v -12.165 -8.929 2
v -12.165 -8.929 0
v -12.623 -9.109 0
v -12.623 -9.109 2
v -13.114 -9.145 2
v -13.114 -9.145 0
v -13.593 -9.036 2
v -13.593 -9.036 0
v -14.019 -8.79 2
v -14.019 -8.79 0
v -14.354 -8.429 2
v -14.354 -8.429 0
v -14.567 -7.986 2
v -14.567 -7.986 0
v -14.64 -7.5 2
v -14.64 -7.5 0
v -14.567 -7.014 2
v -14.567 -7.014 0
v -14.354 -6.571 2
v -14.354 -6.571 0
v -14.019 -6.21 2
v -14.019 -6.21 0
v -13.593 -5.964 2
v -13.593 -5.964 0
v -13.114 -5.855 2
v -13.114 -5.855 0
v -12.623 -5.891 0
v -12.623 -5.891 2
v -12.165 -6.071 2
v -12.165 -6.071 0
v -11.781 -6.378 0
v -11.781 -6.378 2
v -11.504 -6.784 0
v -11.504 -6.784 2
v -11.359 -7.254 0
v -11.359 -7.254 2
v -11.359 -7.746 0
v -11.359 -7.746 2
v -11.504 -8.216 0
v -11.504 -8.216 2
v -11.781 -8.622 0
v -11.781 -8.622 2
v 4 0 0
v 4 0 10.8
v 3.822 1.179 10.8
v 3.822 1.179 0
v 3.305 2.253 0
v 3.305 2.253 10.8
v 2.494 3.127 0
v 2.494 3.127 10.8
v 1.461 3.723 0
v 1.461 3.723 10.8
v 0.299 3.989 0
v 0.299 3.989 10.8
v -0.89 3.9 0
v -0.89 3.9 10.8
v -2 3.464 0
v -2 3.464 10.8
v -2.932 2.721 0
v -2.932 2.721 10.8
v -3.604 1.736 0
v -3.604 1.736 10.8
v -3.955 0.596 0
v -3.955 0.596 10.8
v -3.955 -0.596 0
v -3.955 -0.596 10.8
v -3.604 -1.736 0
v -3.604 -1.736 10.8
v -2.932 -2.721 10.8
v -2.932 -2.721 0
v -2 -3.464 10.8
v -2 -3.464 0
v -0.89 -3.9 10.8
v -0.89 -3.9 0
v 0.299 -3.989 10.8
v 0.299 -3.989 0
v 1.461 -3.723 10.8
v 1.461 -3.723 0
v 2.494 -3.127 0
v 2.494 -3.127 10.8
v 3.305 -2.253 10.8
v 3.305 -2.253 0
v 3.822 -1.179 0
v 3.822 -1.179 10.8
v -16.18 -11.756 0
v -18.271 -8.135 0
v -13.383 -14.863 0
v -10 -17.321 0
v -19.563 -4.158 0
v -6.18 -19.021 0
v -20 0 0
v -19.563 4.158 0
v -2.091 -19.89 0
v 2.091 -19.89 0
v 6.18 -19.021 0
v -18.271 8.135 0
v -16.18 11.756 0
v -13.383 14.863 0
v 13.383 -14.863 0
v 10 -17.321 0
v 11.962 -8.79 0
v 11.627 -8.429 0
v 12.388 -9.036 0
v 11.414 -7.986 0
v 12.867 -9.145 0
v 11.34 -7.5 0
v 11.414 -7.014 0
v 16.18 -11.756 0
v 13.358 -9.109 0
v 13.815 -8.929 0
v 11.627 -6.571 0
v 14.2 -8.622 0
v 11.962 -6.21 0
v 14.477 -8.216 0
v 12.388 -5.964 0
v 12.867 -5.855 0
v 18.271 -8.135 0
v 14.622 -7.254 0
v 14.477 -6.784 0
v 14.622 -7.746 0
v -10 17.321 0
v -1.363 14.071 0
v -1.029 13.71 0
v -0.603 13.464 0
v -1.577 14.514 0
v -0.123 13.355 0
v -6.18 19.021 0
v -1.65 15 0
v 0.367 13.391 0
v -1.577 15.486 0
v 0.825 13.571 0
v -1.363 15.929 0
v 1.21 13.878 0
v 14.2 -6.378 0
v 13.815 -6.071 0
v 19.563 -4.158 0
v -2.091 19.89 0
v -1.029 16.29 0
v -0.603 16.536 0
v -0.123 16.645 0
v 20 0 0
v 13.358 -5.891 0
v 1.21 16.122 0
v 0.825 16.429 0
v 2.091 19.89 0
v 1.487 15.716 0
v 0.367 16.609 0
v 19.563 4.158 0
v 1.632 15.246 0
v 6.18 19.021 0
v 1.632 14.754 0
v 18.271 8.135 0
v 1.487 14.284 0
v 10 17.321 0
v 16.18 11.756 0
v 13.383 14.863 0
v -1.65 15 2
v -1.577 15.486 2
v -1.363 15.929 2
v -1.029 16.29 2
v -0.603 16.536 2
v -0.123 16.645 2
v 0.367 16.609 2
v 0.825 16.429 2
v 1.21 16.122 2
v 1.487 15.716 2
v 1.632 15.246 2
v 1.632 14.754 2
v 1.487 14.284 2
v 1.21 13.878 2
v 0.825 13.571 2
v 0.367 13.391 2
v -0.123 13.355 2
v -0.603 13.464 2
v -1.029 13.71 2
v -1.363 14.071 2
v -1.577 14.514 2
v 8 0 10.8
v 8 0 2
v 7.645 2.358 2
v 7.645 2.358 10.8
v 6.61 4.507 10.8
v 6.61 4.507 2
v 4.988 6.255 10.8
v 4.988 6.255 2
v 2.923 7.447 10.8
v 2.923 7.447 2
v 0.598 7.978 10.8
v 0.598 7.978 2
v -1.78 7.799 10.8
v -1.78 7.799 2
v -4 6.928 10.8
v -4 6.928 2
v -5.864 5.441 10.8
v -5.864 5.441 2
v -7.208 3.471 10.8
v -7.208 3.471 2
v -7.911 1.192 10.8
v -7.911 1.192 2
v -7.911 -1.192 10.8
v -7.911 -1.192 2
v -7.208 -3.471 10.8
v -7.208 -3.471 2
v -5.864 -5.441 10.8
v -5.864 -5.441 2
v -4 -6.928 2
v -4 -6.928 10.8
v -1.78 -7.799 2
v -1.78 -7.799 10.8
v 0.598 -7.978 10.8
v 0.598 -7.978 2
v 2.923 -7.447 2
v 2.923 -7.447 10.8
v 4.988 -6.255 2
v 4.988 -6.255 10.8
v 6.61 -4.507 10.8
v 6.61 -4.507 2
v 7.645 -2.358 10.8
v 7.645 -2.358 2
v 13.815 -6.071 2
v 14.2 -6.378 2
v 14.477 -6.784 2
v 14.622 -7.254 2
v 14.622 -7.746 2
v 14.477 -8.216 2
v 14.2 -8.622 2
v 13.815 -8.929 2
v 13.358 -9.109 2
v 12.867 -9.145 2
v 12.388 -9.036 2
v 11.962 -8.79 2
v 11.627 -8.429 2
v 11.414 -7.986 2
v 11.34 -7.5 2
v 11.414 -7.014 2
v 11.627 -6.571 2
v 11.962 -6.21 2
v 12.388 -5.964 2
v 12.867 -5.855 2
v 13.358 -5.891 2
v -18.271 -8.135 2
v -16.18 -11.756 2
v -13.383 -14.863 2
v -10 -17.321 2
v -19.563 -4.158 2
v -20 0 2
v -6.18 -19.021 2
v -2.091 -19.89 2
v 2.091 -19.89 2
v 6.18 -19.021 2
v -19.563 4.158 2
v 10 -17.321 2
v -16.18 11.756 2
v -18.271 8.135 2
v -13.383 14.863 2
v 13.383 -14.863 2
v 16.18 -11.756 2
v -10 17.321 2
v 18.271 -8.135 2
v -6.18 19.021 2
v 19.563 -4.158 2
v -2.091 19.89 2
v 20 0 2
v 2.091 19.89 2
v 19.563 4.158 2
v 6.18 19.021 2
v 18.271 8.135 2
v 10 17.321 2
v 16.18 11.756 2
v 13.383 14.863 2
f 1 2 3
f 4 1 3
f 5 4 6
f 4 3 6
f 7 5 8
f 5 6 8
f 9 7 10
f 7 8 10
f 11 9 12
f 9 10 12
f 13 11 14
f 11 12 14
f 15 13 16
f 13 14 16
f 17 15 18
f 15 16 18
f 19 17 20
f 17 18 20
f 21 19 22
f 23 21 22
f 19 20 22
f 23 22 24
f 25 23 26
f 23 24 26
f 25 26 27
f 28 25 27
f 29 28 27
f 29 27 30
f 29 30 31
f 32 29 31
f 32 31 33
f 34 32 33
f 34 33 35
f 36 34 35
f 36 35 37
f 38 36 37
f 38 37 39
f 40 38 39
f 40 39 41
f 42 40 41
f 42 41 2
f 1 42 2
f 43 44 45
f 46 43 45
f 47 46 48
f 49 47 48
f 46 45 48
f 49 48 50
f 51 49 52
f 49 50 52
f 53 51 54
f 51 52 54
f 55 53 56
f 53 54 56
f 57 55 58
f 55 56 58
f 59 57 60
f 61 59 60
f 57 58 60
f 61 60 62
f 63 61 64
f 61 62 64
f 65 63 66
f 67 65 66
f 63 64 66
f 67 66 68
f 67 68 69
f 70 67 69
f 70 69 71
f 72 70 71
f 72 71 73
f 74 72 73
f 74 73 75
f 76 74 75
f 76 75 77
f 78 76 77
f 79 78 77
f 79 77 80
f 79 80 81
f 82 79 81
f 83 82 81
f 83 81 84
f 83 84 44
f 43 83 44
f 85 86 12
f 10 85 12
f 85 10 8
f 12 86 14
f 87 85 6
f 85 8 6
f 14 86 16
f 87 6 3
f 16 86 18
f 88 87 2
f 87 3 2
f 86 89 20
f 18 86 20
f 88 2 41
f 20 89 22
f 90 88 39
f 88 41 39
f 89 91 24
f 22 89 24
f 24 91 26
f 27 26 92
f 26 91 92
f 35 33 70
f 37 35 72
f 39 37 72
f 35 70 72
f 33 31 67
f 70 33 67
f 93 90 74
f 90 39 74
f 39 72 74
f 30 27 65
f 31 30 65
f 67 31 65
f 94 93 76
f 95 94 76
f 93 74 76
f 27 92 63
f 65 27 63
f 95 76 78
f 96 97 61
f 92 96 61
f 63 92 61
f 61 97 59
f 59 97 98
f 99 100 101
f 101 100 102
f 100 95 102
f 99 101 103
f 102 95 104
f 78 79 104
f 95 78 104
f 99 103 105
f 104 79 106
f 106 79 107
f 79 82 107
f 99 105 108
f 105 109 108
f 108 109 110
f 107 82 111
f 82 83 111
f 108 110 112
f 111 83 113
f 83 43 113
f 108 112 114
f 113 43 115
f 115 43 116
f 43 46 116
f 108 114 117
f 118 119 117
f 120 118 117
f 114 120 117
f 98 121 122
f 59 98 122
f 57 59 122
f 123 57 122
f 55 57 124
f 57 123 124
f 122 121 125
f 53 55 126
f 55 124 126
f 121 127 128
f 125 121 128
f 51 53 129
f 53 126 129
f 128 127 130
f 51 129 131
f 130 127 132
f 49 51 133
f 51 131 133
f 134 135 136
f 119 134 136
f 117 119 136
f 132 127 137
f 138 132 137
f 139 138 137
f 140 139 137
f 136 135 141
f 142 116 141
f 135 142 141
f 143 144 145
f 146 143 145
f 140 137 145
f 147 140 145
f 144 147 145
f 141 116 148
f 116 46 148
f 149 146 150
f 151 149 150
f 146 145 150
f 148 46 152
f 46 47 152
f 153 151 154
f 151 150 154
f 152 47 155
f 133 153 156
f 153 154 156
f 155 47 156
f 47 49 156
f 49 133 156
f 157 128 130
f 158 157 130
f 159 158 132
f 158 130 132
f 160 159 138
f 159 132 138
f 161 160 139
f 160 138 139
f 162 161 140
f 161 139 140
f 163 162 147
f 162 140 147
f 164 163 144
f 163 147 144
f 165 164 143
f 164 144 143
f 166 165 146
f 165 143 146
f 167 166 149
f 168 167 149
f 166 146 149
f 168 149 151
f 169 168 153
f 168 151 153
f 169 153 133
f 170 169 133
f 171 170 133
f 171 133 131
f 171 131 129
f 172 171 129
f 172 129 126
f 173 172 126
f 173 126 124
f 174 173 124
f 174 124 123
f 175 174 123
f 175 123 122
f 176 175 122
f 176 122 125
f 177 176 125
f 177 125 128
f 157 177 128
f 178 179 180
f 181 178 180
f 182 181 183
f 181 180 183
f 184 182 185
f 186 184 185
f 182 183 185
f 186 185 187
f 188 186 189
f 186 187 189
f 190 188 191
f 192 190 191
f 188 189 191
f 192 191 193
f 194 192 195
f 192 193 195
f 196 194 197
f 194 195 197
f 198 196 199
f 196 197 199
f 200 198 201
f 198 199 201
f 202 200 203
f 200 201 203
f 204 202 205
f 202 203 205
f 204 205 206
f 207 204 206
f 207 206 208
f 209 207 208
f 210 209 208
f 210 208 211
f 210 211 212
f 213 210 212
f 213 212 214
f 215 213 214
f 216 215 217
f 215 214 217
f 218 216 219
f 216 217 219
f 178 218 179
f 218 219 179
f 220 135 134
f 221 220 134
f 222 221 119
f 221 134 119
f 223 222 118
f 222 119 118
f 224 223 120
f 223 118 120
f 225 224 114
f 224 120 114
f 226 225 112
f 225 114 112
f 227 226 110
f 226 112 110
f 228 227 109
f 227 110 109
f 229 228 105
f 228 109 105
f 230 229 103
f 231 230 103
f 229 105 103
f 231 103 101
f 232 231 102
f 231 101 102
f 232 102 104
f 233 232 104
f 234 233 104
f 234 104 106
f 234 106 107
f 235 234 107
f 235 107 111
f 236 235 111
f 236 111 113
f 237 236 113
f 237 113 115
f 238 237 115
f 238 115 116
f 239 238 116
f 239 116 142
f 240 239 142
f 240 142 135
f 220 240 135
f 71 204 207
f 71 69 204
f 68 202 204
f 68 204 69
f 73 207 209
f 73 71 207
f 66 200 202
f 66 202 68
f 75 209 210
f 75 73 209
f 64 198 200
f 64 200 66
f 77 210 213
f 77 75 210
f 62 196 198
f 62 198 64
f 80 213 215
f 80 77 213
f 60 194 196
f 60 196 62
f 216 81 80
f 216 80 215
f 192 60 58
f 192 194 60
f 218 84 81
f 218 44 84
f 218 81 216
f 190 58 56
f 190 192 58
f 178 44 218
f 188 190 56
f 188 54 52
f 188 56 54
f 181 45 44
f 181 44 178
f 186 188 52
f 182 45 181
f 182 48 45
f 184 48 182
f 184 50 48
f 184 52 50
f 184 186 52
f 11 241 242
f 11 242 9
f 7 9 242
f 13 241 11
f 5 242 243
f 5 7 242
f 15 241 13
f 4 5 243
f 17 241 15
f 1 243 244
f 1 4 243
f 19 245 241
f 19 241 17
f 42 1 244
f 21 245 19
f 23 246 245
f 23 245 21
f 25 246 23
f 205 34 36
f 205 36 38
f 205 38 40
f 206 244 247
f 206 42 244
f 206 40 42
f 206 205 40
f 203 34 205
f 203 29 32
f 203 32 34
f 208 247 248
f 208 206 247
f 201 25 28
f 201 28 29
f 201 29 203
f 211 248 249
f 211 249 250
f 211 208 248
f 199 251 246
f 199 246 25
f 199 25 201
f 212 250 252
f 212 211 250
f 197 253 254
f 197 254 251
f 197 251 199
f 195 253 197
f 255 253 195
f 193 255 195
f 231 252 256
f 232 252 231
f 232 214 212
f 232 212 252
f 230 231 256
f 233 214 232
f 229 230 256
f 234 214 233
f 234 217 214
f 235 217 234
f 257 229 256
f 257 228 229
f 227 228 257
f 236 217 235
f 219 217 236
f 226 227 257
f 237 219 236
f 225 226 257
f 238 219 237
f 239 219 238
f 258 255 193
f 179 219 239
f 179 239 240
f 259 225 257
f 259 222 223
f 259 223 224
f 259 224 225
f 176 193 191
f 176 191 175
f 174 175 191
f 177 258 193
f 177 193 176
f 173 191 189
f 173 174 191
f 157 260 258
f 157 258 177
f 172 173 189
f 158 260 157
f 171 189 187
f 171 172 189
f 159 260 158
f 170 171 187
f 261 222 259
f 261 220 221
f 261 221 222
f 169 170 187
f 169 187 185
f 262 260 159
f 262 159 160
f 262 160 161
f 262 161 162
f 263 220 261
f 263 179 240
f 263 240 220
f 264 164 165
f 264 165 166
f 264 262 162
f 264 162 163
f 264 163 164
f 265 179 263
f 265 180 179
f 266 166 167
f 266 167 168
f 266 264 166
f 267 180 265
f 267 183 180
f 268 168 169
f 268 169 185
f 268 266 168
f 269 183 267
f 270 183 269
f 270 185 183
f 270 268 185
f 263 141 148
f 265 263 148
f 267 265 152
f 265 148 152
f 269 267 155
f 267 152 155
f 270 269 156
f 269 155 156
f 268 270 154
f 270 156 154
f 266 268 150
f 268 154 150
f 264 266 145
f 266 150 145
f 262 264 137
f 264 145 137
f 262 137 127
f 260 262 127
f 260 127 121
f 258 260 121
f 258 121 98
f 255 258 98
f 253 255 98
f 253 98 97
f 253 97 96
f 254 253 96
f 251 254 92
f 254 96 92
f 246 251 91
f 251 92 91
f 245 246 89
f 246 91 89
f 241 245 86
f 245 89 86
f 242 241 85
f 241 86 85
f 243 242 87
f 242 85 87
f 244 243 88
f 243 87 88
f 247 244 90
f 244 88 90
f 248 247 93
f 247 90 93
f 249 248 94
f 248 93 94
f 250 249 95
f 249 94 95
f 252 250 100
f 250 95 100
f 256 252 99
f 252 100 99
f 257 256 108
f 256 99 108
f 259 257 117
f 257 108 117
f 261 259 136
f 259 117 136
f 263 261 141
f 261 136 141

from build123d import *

# Parameters (mm, degrees)
SKETCH_1_R               = 20
EXTRUDE_1_DEPTH          = 2
SKETCH_2_R               = 8
EXTRUDE_2_DEPTH          = 8.8
SKETCH_3_R               = 4
CUT_EXTRUDE_1_DEPTH      = 31.276063152
SKETCH_4_R               = 1.65
CUT_EXTRUDE_2_DEPTH      = 31.276063152
PATTERN_CIRCULAR_1_COUNT = 3


with BuildPart() as part:
    # 草图1 → 凸台-拉伸1 (new body)
    with BuildSketch(Plane.XY):
        Circle(SKETCH_1_R)
    extrude(amount=EXTRUDE_1_DEPTH)

    # 草图2 → 凸台-拉伸2 (add)
    with BuildSketch(Plane.XY.offset(2)):
        Circle(SKETCH_2_R)
    extrude(amount=EXTRUDE_2_DEPTH)

    # 草图3 → 切除-拉伸1 (cut, through all)
    with BuildSketch(Plane.XY.offset(10.8)):
        Circle(SKETCH_3_R)
    extrude(amount=-CUT_EXTRUDE_1_DEPTH, mode=Mode.SUBTRACT)

    # 草图4 → 切除-拉伸2 (cut, through all)
    with BuildSketch(Plane(origin=(0, 0, 0), x_dir=(-1, 0, 0), z_dir=(0, 0, -1))):
        with Locations((0, 15)):
            Circle(SKETCH_4_R)
    cut_extrude_2 = extrude(amount=-CUT_EXTRUDE_2_DEPTH, mode=Mode.SUBTRACT)

    # 阵列(圆周)1: 切除-拉伸2 ×3 about axis
    pattern_circular_1_axis = Axis((0, 0, 0), (0, 0, 1))
    for i in range(1, PATTERN_CIRCULAR_1_COUNT):
        add(cut_extrude_2.rotate(pattern_circular_1_axis, i * 360 / PATTERN_CIRCULAR_1_COUNT), mode=Mode.SUBTRACT)


solid = part.part
